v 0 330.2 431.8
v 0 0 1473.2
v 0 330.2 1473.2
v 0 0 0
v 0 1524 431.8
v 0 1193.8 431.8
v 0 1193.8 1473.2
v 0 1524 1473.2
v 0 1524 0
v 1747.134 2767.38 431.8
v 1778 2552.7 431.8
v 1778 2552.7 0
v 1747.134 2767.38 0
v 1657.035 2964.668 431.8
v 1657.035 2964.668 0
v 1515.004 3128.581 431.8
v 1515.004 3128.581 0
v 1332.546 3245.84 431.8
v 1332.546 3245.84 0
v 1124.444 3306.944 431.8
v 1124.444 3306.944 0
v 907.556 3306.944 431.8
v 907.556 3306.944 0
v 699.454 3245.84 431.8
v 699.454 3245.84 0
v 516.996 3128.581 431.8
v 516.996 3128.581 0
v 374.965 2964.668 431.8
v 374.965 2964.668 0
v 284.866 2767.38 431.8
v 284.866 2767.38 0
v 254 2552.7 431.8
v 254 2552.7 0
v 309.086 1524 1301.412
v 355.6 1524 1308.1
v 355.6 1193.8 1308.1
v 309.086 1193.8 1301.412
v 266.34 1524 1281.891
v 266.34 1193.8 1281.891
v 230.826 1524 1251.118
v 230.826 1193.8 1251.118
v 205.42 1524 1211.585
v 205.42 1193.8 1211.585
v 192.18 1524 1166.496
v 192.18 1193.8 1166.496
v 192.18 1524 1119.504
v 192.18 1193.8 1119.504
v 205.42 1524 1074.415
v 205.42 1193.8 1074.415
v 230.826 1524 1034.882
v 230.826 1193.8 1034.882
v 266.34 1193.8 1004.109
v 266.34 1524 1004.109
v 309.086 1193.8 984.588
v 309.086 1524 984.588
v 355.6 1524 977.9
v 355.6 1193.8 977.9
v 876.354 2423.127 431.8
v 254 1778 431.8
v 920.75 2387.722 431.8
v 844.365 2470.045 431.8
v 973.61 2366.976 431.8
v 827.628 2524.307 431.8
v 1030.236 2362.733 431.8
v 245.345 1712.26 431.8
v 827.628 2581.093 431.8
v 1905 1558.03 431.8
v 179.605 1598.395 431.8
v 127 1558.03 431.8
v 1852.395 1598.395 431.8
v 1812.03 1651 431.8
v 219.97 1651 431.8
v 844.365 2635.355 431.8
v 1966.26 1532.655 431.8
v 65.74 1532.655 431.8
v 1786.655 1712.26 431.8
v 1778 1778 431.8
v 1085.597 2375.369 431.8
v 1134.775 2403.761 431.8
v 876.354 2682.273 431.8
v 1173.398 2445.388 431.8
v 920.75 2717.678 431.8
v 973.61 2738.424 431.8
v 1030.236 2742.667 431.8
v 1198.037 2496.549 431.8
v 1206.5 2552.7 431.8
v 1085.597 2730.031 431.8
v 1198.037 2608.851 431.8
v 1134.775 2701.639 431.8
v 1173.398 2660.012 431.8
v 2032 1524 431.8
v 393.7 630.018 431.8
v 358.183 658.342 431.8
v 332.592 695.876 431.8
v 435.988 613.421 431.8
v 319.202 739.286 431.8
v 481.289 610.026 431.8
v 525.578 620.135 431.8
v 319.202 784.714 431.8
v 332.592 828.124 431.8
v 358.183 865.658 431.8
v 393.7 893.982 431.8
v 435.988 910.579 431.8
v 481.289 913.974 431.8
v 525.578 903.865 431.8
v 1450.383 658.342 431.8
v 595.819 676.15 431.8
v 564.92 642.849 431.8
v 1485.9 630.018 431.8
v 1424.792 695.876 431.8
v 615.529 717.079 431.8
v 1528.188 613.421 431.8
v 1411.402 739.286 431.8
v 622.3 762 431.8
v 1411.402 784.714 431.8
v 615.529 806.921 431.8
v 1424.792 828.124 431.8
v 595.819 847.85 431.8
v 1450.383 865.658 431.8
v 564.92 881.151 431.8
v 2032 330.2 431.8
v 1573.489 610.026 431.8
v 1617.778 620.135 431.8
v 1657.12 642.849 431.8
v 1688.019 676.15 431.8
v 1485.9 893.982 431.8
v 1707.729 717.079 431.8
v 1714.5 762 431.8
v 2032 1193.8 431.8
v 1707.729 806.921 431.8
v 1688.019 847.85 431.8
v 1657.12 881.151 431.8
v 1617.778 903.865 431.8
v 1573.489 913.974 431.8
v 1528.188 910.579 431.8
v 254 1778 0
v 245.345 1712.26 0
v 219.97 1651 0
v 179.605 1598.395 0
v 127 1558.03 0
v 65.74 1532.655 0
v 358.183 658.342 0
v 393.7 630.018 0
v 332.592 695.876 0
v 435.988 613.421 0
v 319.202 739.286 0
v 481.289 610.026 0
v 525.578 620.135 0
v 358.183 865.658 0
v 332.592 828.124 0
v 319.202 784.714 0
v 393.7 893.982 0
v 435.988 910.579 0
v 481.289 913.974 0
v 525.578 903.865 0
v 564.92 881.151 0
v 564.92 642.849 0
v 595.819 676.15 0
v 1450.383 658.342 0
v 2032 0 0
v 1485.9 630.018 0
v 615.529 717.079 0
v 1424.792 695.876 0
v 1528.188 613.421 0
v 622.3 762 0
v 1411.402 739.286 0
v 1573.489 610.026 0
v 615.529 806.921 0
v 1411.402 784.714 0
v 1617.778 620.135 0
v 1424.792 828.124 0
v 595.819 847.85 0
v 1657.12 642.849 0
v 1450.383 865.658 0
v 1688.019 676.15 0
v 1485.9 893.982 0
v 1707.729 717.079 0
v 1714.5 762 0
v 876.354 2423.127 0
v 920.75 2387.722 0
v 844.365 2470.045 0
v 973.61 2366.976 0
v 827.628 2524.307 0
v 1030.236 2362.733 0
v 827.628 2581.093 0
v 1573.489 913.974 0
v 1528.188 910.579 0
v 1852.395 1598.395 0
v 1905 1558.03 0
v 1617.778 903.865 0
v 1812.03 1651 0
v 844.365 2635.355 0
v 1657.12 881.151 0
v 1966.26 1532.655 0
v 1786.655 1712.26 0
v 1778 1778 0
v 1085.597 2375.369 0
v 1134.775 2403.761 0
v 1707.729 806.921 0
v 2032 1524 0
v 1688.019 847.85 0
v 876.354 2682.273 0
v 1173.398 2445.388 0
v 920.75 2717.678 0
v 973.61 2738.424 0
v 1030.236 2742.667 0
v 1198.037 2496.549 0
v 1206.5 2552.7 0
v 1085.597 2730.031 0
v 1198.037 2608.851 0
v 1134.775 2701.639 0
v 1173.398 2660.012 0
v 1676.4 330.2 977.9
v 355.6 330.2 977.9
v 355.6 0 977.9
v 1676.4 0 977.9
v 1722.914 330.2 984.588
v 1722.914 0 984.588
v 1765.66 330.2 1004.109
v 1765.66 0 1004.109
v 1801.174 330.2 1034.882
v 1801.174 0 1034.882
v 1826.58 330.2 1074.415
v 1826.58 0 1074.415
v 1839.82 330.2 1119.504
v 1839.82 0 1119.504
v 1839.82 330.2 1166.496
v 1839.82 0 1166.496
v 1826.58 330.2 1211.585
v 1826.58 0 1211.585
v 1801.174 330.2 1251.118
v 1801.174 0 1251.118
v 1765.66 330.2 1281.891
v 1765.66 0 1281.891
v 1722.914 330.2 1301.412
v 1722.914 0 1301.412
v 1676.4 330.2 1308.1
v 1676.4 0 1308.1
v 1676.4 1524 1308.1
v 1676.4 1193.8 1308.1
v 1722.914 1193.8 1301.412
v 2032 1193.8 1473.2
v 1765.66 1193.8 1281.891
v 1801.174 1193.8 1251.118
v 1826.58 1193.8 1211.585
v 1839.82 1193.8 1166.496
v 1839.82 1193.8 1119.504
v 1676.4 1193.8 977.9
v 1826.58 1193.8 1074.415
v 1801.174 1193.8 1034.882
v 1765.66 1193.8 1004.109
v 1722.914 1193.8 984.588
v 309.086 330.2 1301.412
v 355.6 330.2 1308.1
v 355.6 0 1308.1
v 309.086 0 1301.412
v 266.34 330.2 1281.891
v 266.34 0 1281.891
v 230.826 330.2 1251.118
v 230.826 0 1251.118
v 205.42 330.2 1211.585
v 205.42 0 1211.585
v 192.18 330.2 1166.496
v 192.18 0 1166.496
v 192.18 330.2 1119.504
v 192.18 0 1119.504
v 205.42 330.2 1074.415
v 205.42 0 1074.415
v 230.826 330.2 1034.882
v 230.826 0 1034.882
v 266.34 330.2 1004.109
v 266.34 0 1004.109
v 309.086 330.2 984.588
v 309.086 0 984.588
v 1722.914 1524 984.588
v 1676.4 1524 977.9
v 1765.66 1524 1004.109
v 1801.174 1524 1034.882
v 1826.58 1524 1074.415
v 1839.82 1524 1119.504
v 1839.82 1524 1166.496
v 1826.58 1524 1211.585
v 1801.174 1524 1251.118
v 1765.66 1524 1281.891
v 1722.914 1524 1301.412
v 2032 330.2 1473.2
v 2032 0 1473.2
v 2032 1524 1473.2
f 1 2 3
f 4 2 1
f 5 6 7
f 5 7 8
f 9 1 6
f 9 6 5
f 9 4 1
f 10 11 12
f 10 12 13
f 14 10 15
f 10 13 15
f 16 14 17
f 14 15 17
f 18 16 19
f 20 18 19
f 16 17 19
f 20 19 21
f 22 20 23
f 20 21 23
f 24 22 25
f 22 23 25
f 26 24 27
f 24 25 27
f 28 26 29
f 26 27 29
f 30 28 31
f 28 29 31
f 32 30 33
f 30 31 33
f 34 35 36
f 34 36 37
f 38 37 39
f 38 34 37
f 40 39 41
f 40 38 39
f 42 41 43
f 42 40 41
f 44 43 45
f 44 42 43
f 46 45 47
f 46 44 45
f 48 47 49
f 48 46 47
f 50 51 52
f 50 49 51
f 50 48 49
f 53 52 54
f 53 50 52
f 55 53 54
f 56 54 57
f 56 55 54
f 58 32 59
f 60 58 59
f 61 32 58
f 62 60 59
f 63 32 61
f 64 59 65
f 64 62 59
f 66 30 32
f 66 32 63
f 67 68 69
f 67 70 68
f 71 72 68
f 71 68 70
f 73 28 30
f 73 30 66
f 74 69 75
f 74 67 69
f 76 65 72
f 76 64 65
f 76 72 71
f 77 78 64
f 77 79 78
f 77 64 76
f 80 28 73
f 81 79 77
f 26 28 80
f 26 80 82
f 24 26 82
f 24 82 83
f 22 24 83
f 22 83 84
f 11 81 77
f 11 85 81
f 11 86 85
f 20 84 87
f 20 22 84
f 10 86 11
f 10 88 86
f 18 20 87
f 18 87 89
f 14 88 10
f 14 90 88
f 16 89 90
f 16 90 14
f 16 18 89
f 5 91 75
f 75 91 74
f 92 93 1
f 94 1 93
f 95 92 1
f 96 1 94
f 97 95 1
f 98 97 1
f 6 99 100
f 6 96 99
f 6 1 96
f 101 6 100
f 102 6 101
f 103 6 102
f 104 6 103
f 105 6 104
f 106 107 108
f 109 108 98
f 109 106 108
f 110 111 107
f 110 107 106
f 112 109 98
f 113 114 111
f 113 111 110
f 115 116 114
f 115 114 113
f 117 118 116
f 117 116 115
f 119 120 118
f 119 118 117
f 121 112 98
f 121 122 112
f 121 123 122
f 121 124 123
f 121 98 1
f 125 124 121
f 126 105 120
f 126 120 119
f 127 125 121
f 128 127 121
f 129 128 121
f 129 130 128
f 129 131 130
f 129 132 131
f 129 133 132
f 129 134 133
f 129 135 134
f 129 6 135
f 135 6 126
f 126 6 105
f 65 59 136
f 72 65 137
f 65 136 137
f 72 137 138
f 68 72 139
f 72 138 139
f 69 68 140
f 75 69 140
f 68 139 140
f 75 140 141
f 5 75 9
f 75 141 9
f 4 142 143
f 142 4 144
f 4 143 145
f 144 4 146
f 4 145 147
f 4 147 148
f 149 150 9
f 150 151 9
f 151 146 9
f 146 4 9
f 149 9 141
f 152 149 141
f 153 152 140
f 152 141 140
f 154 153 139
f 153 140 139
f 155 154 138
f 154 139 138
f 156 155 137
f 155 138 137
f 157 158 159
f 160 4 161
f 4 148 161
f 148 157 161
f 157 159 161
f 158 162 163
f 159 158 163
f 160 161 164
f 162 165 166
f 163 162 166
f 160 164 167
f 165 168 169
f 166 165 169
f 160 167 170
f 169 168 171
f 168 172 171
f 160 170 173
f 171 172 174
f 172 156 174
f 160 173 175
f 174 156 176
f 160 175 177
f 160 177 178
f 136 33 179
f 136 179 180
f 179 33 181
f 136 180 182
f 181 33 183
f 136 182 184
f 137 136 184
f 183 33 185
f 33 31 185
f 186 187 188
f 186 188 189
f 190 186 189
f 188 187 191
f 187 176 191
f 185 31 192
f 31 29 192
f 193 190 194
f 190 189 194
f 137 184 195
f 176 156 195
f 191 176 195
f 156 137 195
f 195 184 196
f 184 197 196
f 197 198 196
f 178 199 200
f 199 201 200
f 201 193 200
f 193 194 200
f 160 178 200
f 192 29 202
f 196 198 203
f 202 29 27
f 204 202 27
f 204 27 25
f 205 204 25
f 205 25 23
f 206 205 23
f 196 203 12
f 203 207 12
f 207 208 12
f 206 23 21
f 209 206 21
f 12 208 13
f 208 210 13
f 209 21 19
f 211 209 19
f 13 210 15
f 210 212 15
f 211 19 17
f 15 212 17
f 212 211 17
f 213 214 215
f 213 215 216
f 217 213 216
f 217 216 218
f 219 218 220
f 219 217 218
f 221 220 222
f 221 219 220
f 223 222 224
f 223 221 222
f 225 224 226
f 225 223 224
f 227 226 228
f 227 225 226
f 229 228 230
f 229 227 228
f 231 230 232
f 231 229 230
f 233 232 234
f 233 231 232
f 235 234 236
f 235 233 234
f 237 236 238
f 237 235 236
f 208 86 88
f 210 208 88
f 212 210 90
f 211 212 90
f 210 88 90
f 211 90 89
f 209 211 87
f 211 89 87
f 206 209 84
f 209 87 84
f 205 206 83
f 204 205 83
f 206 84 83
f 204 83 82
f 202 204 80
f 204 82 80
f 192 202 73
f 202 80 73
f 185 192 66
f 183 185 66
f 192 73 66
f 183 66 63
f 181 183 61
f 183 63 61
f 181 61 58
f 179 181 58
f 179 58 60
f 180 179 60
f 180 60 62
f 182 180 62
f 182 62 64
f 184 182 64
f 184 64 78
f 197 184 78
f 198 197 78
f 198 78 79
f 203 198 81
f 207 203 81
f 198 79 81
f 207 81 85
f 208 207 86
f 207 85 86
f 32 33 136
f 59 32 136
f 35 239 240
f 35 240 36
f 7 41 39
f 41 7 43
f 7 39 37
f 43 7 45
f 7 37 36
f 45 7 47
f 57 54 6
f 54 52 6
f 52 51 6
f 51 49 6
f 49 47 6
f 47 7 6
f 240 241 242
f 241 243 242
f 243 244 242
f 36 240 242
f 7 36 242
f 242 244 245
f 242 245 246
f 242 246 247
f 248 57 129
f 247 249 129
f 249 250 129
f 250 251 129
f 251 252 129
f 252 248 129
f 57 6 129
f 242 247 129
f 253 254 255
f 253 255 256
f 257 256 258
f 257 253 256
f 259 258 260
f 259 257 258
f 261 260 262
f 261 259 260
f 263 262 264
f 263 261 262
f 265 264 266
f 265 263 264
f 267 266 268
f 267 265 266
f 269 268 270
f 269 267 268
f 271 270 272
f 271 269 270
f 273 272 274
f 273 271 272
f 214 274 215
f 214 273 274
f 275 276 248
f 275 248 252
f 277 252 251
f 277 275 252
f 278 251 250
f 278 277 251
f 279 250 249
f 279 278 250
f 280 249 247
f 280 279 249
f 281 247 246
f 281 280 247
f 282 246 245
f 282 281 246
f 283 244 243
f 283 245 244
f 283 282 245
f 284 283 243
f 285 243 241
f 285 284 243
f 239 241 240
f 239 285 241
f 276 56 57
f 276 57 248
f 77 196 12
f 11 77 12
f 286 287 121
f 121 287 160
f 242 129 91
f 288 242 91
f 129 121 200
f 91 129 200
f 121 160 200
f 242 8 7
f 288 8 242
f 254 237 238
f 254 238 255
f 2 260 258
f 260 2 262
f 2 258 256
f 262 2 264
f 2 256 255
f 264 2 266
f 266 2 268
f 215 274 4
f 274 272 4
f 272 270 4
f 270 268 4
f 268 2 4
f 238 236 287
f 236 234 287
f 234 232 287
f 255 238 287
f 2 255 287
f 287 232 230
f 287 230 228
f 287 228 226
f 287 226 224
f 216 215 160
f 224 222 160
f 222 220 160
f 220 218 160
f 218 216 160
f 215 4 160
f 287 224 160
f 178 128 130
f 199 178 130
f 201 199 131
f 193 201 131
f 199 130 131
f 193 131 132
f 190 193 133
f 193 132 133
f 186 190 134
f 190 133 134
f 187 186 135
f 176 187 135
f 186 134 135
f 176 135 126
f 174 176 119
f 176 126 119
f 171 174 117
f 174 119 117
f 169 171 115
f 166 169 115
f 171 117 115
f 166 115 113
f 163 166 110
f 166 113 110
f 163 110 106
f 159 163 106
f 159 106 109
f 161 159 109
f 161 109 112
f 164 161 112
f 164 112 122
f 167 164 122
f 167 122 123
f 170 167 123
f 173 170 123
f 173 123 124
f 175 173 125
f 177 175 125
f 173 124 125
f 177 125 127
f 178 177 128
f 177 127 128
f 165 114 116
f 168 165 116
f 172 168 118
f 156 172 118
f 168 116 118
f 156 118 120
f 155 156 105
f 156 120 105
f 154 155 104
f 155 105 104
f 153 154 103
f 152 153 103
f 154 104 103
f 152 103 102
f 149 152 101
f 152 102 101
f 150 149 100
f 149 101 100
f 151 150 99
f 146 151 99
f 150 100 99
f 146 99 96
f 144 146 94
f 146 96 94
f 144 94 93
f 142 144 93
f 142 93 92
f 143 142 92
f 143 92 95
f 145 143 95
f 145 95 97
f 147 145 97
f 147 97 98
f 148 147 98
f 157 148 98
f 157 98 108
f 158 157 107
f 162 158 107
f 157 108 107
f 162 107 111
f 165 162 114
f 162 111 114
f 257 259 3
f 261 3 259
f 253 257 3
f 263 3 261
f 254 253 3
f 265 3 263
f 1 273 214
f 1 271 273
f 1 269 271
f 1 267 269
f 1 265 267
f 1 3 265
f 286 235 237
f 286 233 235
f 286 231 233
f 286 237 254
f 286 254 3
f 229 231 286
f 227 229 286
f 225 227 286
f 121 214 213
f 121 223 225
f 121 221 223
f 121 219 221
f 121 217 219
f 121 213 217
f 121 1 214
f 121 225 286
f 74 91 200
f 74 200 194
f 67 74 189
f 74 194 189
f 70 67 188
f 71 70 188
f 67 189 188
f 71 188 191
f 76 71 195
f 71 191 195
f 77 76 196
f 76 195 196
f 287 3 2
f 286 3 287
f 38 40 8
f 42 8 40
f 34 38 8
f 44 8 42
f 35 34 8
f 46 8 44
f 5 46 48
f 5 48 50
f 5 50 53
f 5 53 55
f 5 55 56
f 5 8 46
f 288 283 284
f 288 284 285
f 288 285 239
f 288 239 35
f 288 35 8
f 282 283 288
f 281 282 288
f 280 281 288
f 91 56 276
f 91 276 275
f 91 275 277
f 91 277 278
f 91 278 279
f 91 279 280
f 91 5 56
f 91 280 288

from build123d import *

# Parameters (mm, degrees)
BOSS_EXTRUDE1_DEPTH = 431.8
SKETCH2_R           = 152.4
SKETCH2_R_2         = 190.5
CUT_EXTRUDE1_DEPTH  = 431.8
SKETCH3_W           = 2032
SKETCH3_H           = 330.2
BOSS_EXTRUDE2_DEPTH = 1041.4
CUT_EXTRUDE2_DEPTH  = 3084.171861898


with BuildPart() as part:
    # Sketch1 → Boss-Extrude1 (new body)
    with BuildSketch(Plane.XY):
        with BuildLine():
            Line((0, 0), (2032, 0))
            Line((2032, 0), (2032, 1524))
            ThreePointArc((2032, 1524), (1852.394877579, 1598.394877579), (1778, 1778))
            Line((1778, 1778), (1778, 2552.7))
            ThreePointArc((1778, 2552.7), (1016, 3314.7), (254, 2552.7))
            Line((254, 2552.7), (254, 1778))
            ThreePointArc((254, 1778), (179.605122421, 1598.394877579), (0, 1524))
            Line((0, 1524), (0, 0))
        make_face()
    extrude(amount=BOSS_EXTRUDE1_DEPTH)

    # Sketch2 → Cut-Extrude1 (cut)
    with BuildSketch(Plane.XY.offset(431.8)):
        with Locations((469.9, 762)):
            Circle(SKETCH2_R)
        with Locations((1562.1, 762)):
            Circle(SKETCH2_R)
        with Locations((1016, 2552.7)):
            Circle(SKETCH2_R_2)
    extrude(amount=-CUT_EXTRUDE1_DEPTH, mode=Mode.SUBTRACT)

    # Sketch3 → Boss-Extrude2 (add)
    with BuildSketch(Plane.XY.offset(431.8)):
        with Locations((1016, 165.1)):
            Rectangle(SKETCH3_W, SKETCH3_H)
        with Locations((1016, 1358.9)):
            Rectangle(SKETCH3_W, SKETCH3_H)
    extrude(amount=BOSS_EXTRUDE2_DEPTH)

    # Sketch4 → Cut-Extrude2 (cut, through all)
    with BuildSketch(Plane(origin=(0, 1524, 0), x_dir=(1, 0, 0), z_dir=(0, 1, 0))):
        with BuildLine():
            Line((355.6, -977.9), (1676.4, -977.9))
            ThreePointArc((1676.4, -977.9), (1841.5, -1143), (1676.4, -1308.1))
            Line((1676.4, -1308.1), (355.6, -1308.1))
            ThreePointArc((355.6, -1308.1), (190.5, -1143), (355.6, -977.9))
        make_face()
    extrude(amount=-CUT_EXTRUDE2_DEPTH, mode=Mode.SUBTRACT)


solid = part.part
